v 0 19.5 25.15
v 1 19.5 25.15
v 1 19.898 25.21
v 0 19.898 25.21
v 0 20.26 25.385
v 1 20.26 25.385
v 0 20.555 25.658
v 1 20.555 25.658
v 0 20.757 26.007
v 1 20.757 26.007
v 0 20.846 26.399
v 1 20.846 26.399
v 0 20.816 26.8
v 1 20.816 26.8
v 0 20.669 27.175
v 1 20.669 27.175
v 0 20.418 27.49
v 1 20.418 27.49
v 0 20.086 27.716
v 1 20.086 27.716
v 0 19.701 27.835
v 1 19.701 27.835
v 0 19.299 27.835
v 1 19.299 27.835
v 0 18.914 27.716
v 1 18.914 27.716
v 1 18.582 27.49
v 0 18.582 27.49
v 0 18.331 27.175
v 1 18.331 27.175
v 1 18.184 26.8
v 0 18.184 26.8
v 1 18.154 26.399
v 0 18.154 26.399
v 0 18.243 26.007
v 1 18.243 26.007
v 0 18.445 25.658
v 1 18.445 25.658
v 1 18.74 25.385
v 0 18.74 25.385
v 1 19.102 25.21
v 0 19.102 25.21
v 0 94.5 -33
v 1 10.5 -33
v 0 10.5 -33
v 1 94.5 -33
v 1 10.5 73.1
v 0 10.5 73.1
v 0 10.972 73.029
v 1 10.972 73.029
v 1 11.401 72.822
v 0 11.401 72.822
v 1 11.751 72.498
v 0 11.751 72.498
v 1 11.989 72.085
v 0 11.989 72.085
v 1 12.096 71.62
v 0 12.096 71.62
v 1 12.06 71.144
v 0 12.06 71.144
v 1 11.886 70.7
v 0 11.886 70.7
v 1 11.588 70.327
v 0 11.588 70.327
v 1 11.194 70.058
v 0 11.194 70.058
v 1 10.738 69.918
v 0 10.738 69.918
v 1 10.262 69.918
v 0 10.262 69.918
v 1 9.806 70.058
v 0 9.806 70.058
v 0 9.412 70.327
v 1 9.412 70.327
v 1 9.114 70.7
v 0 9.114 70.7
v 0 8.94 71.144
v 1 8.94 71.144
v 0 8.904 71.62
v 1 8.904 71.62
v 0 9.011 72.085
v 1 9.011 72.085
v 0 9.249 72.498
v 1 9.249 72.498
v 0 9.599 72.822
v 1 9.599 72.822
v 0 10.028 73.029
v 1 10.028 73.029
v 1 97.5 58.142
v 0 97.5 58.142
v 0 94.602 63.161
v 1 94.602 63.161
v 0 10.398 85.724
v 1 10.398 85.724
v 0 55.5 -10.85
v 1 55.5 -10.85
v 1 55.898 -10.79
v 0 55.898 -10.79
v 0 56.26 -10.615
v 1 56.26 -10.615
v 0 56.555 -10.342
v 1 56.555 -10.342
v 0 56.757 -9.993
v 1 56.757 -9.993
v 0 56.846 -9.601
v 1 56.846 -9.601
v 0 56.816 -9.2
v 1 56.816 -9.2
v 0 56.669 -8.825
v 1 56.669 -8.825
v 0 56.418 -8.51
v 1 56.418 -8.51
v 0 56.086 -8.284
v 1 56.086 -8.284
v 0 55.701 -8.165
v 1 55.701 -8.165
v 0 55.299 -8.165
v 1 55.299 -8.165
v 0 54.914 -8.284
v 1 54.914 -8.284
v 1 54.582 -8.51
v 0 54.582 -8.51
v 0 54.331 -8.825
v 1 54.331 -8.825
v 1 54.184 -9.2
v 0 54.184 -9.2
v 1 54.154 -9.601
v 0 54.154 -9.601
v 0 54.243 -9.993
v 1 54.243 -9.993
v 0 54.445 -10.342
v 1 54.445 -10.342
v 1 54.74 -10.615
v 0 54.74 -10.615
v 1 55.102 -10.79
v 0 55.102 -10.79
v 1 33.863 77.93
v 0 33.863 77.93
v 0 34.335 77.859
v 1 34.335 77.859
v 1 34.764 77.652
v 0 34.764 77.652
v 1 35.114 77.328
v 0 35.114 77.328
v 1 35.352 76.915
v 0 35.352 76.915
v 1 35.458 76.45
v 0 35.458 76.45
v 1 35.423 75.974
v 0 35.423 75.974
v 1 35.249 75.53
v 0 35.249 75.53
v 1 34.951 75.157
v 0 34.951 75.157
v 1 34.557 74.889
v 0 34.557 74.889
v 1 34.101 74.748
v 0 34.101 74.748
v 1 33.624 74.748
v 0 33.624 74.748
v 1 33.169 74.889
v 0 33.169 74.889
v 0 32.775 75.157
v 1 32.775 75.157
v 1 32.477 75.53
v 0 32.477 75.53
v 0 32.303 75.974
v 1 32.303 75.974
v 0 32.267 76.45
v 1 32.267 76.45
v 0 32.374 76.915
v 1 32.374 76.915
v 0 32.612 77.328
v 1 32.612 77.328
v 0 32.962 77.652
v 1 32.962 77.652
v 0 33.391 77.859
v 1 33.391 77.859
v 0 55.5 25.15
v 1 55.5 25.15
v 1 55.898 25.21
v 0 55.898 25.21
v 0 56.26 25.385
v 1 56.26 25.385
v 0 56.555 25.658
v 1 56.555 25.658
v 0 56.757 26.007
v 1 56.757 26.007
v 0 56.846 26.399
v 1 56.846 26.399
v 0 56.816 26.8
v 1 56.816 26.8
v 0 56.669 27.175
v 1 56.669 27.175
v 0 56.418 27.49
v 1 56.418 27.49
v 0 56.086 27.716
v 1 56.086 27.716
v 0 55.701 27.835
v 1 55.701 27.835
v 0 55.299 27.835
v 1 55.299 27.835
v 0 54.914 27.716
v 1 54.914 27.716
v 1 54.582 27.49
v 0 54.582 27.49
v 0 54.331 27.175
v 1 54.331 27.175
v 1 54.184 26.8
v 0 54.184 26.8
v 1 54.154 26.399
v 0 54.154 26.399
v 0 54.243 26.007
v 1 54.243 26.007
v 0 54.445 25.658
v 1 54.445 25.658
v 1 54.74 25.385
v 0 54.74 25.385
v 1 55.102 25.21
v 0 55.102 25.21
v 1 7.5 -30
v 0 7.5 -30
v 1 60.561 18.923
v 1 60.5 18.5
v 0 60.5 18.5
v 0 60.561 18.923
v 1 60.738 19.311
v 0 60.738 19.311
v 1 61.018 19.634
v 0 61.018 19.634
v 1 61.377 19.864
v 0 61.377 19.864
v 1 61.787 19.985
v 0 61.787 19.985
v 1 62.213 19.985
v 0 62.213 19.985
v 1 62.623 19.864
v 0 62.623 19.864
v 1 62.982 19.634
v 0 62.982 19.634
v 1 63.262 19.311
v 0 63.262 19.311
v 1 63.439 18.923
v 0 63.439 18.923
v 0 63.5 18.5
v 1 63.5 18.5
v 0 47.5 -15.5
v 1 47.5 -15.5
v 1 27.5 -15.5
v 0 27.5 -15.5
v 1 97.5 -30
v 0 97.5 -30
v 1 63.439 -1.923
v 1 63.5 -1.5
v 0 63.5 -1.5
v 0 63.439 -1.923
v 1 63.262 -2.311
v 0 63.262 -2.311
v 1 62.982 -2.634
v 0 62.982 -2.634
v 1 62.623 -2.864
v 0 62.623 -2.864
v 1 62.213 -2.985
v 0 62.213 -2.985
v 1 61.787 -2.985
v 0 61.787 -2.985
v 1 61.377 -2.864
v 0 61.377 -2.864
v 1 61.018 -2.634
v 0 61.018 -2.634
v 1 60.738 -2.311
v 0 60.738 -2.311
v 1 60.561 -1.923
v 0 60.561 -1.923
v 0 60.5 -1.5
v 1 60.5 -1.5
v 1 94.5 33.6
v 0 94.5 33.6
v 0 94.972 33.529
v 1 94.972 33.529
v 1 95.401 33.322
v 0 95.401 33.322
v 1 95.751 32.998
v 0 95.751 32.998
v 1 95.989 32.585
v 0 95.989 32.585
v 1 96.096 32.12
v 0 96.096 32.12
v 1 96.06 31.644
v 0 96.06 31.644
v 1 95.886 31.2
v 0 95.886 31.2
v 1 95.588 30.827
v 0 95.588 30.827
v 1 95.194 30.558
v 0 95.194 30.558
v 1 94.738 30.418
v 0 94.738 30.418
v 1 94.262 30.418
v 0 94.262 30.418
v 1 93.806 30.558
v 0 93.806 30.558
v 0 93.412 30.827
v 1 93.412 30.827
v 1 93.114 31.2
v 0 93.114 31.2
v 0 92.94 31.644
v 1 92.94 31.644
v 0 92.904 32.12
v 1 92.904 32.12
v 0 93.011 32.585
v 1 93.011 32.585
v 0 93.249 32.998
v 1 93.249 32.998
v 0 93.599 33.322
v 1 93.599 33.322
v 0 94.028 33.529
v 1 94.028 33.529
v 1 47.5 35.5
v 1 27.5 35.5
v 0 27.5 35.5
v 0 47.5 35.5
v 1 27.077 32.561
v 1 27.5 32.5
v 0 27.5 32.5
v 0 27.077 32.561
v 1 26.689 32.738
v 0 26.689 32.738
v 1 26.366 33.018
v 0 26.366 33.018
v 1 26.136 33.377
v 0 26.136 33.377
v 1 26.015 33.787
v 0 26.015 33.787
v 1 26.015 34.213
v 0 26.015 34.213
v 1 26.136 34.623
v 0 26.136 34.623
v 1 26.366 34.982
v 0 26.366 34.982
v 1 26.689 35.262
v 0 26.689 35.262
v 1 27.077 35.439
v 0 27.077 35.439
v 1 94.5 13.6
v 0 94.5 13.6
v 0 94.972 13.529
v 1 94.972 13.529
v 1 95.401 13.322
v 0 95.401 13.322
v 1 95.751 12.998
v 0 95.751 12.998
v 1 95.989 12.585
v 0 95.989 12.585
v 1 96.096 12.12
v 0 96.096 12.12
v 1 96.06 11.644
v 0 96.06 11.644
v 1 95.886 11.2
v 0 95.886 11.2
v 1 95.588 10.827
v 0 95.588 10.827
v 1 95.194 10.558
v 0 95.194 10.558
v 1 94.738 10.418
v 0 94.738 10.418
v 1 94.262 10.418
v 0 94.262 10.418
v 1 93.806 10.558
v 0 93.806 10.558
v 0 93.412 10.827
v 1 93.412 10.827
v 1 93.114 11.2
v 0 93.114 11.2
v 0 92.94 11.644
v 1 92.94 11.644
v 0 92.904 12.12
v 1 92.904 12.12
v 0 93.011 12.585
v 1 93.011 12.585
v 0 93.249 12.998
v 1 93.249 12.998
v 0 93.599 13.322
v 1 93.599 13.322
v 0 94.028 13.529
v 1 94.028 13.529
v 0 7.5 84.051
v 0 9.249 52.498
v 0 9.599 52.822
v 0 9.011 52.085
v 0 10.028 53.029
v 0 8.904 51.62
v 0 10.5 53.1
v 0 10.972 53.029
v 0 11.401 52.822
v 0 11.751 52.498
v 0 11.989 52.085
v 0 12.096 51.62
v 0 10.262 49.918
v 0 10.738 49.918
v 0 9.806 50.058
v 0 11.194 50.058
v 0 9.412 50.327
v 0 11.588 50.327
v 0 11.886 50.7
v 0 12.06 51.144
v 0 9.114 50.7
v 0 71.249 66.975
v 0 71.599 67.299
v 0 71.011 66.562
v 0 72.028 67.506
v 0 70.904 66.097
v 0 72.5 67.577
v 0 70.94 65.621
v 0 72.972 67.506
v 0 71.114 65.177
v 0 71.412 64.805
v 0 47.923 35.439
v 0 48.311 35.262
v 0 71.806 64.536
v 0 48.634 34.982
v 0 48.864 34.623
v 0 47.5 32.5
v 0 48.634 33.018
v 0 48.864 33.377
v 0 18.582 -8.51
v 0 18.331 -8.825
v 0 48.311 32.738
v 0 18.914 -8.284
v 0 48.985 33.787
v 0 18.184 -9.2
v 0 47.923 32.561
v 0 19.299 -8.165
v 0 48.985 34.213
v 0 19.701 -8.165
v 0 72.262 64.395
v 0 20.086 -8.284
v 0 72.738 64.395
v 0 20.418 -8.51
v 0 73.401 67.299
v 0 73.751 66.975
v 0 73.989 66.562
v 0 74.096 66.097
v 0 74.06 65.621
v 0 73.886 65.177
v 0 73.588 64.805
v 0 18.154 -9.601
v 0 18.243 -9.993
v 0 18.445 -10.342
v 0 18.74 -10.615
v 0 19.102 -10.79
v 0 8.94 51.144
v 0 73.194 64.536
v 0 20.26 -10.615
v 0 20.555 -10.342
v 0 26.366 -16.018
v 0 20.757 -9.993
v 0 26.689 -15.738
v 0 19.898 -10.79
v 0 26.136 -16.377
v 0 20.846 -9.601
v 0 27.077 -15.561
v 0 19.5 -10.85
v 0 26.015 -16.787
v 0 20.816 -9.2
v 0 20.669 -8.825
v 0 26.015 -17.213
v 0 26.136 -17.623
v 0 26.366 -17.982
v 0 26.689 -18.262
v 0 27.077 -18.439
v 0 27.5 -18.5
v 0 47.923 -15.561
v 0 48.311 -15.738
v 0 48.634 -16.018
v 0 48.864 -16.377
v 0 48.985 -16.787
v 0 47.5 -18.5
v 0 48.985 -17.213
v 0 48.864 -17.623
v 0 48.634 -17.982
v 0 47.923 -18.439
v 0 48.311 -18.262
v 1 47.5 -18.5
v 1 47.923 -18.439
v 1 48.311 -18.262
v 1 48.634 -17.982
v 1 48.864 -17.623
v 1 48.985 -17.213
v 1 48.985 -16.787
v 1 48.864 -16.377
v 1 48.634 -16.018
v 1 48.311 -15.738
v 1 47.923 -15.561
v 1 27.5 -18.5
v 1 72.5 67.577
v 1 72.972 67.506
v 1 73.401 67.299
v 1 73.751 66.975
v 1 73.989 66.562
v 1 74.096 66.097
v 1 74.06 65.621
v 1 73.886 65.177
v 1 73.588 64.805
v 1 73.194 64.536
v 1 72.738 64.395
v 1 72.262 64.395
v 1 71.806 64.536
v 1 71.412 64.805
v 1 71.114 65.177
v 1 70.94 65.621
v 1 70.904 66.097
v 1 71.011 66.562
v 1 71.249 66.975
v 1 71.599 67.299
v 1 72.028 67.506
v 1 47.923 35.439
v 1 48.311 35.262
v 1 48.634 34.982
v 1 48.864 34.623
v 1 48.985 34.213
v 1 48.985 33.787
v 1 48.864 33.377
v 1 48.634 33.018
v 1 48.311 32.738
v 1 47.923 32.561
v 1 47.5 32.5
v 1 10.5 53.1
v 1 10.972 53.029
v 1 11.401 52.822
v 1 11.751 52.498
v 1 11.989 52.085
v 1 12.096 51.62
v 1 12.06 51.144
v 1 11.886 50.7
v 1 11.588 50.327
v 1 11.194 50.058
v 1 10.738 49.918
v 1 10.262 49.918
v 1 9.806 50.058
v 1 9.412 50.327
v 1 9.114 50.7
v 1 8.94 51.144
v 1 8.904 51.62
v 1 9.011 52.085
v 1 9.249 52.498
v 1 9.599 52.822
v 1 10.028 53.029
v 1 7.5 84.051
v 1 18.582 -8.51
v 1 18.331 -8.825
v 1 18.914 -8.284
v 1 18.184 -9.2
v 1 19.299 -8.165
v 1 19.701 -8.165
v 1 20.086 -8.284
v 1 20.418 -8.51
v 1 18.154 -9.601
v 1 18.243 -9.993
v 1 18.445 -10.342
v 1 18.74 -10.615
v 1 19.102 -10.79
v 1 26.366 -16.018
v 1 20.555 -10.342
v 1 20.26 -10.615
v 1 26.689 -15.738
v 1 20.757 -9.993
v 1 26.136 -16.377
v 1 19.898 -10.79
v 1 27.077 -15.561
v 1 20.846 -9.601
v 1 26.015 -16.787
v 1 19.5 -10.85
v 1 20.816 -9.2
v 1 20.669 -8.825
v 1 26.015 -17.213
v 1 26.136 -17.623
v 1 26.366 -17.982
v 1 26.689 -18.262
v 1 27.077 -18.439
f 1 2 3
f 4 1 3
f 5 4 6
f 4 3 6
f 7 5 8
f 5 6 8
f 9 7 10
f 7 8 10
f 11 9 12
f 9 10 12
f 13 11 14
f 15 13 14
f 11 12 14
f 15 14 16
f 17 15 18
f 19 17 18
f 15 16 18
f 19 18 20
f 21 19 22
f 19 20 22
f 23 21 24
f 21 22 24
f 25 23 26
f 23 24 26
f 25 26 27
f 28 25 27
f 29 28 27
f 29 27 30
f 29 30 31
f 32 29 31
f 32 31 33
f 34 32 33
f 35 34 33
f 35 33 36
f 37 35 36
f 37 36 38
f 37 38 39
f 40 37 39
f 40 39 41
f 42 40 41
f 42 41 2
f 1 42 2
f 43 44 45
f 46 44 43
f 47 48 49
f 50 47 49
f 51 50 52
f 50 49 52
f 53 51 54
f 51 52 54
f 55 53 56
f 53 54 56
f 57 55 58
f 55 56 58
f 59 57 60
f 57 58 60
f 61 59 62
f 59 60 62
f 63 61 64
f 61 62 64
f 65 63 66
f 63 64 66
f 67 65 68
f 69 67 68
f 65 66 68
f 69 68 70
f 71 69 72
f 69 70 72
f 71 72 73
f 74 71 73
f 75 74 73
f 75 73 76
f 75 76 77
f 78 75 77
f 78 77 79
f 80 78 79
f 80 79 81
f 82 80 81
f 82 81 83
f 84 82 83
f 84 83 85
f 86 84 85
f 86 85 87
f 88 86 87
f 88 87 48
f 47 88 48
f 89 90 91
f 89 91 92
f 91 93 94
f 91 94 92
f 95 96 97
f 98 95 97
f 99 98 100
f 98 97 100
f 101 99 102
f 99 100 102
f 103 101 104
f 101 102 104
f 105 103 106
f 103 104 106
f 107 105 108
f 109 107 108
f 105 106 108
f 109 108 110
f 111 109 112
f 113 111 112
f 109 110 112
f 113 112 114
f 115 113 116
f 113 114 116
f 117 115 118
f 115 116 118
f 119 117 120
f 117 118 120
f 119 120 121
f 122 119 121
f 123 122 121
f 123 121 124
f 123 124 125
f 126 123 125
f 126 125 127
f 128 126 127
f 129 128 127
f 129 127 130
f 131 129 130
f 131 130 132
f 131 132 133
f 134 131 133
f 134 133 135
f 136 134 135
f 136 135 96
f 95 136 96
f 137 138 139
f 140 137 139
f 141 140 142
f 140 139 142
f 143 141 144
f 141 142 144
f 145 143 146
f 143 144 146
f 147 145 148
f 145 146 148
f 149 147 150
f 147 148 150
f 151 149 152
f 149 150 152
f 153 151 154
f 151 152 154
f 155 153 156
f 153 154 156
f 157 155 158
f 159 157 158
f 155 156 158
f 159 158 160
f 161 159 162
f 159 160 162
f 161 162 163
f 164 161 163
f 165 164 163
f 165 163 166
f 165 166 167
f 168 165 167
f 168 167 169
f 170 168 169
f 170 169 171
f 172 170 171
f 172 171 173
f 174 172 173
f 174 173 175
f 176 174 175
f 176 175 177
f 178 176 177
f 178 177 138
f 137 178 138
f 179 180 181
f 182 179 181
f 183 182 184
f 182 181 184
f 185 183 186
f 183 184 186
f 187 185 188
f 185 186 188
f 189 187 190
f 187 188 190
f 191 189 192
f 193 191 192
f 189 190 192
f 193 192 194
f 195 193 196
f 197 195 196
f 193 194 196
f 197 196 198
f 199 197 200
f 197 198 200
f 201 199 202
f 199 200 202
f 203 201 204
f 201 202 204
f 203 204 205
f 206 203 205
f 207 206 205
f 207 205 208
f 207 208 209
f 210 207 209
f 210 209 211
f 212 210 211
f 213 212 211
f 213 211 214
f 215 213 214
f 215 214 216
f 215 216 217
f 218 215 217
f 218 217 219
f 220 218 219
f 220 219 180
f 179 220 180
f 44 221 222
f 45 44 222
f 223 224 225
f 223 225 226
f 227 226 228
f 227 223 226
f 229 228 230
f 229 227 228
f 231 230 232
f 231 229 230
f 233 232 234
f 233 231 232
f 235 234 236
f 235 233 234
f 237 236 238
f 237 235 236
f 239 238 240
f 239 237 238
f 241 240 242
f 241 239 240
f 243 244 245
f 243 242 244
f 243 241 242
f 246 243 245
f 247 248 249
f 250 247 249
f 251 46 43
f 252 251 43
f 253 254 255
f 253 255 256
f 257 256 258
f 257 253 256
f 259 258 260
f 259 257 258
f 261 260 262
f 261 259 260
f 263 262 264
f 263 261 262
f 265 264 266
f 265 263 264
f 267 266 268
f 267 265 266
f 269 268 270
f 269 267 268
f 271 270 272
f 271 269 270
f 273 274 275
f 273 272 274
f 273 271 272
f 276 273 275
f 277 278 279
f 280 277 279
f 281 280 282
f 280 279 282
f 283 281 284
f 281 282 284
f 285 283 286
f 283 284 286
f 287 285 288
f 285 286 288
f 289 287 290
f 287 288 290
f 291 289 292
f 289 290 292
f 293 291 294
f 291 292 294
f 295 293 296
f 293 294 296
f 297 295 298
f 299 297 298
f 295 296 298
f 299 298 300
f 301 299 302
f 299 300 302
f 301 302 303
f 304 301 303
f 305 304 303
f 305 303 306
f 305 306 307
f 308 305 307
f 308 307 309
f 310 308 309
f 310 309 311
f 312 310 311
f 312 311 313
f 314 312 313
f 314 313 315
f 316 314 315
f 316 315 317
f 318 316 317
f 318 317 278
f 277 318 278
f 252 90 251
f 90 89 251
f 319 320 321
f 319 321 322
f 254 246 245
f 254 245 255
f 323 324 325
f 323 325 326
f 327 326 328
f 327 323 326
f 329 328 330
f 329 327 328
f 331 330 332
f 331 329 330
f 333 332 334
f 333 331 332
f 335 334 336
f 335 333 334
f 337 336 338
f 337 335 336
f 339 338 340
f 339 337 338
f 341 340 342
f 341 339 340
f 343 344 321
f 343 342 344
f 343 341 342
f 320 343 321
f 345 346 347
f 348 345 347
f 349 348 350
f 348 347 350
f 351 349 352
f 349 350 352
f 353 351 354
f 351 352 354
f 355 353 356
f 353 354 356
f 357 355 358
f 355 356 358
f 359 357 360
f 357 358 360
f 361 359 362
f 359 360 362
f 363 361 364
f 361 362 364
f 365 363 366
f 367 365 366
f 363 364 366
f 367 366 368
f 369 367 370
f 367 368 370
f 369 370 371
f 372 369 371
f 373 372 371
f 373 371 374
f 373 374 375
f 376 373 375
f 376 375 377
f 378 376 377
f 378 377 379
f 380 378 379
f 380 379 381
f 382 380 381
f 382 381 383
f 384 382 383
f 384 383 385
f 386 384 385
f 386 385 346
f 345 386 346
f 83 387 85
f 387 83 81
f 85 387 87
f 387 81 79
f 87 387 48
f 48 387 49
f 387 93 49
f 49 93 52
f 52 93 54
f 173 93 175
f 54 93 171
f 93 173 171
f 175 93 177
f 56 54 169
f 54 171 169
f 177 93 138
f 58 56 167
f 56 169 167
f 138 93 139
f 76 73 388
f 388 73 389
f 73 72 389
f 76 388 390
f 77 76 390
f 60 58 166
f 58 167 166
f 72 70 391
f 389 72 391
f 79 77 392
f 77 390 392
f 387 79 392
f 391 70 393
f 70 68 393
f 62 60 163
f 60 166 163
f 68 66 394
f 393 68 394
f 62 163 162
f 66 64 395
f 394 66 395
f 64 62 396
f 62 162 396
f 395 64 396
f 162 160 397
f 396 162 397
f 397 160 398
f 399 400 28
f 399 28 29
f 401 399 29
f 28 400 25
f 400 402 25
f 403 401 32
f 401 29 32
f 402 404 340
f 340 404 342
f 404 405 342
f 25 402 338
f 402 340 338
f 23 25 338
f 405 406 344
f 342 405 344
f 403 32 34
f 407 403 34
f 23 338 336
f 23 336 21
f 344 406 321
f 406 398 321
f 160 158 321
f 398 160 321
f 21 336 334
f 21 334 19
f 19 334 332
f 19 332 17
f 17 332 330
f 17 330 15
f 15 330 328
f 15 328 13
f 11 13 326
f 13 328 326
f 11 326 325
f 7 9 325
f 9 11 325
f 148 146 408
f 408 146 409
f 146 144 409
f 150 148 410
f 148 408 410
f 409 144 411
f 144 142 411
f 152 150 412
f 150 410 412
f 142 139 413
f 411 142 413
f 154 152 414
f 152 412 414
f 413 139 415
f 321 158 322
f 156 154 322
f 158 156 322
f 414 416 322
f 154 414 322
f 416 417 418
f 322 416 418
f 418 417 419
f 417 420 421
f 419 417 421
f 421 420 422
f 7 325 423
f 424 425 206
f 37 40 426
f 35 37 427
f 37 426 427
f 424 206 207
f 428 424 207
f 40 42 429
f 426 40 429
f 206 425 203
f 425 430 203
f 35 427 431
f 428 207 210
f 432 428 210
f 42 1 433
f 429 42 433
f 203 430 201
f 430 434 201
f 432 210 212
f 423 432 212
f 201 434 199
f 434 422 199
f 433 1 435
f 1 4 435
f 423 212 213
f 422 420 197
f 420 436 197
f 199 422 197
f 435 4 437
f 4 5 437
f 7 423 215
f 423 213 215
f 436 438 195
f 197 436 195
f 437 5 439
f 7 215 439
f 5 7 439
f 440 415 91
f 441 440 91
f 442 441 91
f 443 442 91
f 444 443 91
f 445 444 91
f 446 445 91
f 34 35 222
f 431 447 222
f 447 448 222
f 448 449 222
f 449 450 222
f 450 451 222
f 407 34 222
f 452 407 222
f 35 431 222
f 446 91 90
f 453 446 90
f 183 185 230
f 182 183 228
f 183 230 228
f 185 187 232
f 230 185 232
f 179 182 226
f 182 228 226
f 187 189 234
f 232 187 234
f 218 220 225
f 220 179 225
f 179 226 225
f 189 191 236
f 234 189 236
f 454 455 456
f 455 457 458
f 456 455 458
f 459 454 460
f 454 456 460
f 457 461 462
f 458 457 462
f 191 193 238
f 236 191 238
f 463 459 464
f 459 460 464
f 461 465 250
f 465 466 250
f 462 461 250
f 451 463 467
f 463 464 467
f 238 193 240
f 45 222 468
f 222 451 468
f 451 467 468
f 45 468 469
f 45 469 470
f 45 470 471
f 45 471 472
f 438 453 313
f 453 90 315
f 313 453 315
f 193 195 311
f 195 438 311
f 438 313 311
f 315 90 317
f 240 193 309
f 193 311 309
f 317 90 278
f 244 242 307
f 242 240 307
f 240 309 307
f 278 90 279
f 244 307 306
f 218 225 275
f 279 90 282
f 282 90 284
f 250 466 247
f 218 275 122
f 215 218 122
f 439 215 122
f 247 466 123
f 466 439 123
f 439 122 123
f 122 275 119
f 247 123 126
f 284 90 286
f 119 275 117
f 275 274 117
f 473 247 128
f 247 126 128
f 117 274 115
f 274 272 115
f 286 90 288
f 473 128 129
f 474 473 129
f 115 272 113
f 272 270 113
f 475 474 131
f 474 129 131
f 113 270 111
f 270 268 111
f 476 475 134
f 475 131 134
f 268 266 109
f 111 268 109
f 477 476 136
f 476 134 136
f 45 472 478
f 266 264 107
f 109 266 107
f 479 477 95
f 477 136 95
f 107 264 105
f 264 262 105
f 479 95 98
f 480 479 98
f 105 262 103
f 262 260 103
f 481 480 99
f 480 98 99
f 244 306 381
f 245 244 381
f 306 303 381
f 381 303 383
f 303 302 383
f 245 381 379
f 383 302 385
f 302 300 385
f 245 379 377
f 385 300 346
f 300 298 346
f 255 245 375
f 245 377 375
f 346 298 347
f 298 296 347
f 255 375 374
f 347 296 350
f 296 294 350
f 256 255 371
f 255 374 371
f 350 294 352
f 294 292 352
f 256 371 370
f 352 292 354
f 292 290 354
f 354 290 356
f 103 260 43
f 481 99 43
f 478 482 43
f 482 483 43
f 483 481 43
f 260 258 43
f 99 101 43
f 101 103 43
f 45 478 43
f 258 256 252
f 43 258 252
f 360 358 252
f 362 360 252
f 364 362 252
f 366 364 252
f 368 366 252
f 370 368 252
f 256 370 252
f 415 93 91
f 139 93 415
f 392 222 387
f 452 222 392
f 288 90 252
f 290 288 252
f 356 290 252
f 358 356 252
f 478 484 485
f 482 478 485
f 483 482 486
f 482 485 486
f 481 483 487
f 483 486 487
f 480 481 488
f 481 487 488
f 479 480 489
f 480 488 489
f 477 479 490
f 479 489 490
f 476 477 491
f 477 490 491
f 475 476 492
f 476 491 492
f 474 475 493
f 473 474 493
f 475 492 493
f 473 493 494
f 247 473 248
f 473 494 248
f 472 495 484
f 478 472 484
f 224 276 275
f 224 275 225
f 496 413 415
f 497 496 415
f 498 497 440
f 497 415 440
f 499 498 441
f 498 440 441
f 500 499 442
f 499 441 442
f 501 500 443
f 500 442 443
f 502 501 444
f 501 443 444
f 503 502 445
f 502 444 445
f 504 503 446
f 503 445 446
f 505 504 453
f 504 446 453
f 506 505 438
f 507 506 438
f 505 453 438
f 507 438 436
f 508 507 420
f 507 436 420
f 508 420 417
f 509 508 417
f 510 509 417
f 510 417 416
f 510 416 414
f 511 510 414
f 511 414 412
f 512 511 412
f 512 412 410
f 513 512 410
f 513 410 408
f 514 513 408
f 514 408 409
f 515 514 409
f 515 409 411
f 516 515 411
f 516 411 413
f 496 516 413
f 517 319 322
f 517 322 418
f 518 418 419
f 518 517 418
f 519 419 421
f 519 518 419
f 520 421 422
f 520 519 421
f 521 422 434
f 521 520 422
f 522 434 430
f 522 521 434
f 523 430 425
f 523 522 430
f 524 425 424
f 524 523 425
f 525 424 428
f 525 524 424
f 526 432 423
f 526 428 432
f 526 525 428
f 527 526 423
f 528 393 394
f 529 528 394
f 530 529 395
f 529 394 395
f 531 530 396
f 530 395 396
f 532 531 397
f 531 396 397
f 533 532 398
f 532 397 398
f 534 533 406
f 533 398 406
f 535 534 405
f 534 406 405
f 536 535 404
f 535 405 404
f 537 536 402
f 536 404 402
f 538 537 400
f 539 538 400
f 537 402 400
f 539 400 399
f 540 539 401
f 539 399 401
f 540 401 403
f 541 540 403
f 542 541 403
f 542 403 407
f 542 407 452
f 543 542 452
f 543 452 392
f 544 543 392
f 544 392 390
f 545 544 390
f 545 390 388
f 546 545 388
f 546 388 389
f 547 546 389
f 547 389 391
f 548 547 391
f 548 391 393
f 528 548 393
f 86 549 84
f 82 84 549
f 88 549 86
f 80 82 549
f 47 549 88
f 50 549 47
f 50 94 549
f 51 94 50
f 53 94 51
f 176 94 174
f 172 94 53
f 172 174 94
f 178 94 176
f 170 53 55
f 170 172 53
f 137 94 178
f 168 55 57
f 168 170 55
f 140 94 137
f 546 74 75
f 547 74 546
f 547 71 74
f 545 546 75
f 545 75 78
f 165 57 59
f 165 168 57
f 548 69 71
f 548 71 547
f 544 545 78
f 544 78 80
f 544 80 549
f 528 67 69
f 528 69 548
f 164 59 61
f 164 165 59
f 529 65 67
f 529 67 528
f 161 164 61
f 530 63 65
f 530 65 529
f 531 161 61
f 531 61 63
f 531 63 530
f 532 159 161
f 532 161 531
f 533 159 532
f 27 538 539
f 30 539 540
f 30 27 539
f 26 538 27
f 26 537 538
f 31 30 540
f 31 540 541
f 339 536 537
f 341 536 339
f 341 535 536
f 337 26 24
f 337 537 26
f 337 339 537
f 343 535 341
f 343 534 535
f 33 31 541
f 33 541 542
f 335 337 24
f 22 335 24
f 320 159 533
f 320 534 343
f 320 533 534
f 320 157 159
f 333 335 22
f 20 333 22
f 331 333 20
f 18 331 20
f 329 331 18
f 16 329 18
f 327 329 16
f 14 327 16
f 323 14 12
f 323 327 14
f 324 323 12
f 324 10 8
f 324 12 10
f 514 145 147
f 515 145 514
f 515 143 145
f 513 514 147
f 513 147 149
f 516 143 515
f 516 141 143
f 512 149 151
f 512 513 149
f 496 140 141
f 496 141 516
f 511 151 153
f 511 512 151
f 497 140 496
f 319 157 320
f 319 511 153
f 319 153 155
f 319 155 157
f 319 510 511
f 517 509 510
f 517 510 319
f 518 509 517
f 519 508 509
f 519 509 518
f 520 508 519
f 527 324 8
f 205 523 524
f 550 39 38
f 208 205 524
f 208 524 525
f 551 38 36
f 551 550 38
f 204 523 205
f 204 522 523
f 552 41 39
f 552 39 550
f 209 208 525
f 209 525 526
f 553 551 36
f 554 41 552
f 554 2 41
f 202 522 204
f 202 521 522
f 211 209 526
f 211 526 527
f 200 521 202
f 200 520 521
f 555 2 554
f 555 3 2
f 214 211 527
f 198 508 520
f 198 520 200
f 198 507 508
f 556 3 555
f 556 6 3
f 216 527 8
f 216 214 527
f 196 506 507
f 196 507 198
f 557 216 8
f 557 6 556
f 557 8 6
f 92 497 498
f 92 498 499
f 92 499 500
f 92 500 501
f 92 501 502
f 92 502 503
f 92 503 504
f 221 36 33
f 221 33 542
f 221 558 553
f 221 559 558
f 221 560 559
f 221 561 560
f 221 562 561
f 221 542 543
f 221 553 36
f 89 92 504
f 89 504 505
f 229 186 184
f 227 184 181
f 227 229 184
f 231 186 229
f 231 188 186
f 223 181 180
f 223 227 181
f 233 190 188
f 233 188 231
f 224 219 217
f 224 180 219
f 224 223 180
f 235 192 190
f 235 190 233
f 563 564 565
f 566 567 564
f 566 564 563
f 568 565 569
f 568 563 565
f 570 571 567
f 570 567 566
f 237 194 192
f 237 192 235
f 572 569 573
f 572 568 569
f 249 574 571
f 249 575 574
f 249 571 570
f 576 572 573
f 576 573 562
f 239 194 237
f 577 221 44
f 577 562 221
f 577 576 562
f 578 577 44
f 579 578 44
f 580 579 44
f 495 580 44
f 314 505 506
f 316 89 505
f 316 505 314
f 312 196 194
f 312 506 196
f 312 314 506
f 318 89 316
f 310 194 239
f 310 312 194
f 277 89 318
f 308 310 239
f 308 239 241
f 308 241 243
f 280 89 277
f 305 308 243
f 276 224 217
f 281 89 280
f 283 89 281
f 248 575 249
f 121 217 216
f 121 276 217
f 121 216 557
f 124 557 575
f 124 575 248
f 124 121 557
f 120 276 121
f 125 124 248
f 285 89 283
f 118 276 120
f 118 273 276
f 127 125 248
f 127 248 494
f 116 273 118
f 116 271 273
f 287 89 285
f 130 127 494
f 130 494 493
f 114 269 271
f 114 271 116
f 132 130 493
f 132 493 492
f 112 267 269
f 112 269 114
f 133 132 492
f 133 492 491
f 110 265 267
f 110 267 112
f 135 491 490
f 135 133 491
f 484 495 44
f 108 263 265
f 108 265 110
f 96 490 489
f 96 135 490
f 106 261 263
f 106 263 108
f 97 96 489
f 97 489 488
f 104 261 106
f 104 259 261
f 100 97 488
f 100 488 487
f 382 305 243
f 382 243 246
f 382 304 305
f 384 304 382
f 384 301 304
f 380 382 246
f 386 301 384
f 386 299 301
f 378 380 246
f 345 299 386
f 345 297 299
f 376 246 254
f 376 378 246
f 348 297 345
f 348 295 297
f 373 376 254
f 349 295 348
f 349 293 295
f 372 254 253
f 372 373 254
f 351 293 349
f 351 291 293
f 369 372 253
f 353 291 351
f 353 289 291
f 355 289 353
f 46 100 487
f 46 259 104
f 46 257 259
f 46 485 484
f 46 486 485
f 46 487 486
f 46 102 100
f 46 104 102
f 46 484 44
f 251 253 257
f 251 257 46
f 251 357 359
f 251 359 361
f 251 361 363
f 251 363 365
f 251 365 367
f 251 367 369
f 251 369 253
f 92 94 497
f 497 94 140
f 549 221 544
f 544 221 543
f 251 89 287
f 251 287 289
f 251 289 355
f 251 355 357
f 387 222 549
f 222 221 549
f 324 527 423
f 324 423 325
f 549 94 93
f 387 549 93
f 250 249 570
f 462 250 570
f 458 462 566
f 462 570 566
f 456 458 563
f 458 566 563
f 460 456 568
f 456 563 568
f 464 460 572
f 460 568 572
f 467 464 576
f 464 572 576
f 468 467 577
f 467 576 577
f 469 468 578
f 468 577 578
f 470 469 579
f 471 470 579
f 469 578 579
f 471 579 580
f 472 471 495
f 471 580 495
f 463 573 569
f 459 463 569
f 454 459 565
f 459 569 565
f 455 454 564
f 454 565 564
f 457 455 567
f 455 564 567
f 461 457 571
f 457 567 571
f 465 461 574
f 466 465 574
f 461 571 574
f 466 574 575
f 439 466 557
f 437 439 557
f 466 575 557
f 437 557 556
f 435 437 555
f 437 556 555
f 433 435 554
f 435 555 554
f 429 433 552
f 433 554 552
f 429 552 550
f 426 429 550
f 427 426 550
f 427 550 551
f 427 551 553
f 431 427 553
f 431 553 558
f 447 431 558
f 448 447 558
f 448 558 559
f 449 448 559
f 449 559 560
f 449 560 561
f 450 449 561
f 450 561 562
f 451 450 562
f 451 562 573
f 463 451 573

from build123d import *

# Parameters (mm, degrees)
SKETCH_1_W               = 60
SKETCH_1_H               = 44
SKETCH_1_R               = 1.6
EXTRUDE_1_DEPTH          = 1
SKETCH_2_W               = 134.5
SKETCH_2_H               = 90
EXTRUDE_2_DEPTH          = 1
CUT_EXTRUDE_1_DEPTH      = 2
SKETCH_4_R               = 1.6
CUT_EXTRUDE_2_DEPTH      = 2
SKETCH_5_R               = 1.35
CUT_EXTRUDE_3_DEPTH      = 2
SKETCH_6_W               = 15
SKETCH_6_H               = 90
CUT_EXTRUDE_4_DEPTH      = 1
CUT_EXTRUDE_4_DEPTH_BACK = 2
SKETCH_7_W               = 9
SKETCH_7_H               = 22.5
CUT_EXTRUDE_5_DEPTH      = 2
FILLET_1_R               = 2
CUT_EXTRUDE_6_DEPTH      = 2
CUT_EXTRUDE_7_DEPTH      = 2
CHAMFER_2_SIZE           = 3
CHAMFER_2_EDGE_2_SIZE    = 3
CHAMFER_2_EDGE_3_SIZE2   = 3
CHAMFER_2_EDGE_3_SIZE    = 2.449489743
CHAMFER_2_EDGE_4_SIZE2   = 4.242640687
CHAMFER_2_EDGE_4_SIZE    = 3


with BuildPart() as part:
    # 草图1 → 凸台-拉伸1 (new body)
    with BuildSketch(Plane(origin=(0, 0, 0), x_dir=(0, 0, -1), z_dir=(1, 0, 0))):
        with Locations((18, -14.5)):
            Rectangle(SKETCH_1_W, SKETCH_1_H)
        Circle(SKETCH_1_R, mode=Mode.SUBTRACT)
        with Locations((17, 0)):
            Circle(SKETCH_1_R, mode=Mode.SUBTRACT)
        with Locations((0, -30.5)):
            Circle(SKETCH_1_R, mode=Mode.SUBTRACT)
        with Locations((17, -30.5)):
            Circle(SKETCH_1_R, mode=Mode.SUBTRACT)
        with Locations((31.5, -30.5)):
            Circle(SKETCH_1_R, mode=Mode.SUBTRACT)
    extrude(amount=EXTRUDE_1_DEPTH)

    # 草图2 → 凸台-拉伸2 (add)
    with BuildSketch(Plane(origin=(1, 0, 0), x_dir=(0, 0, -1), z_dir=(1, 0, 0))):
        with Locations((-19.25, 52.5)):
            Rectangle(SKETCH_2_W, SKETCH_2_H)
    extrude(amount=-EXTRUDE_2_DEPTH)

    # 草图3 → 切除-拉伸1 (cut, through all)
    with BuildSketch(Plane.ZY):
        Polygon((86.5, 7.5), (62.384572681, 97.5), (86.5, 97.5), align=None)
    extrude(amount=-CUT_EXTRUDE_1_DEPTH, mode=Mode.SUBTRACT)

    # 草图4 → 切除-拉伸2 (cut, through all)
    with BuildSketch(Plane.ZY):
        with Locations((71.5, 10.5)):
            Circle(SKETCH_4_R)
        with Locations((51.5, 10.5)):
            Circle(SKETCH_4_R)
        with Locations((12, 94.5)):
            Circle(SKETCH_4_R)
        with Locations((32, 94.5)):
            Circle(SKETCH_4_R)
        with Locations((65.977473951, 72.5)):
            Circle(SKETCH_4_R)
        with Locations((76.330235755, 33.862966948)):
            Circle(SKETCH_4_R)
    extrude(amount=-CUT_EXTRUDE_2_DEPTH, mode=Mode.SUBTRACT)

    # 草图5 → 切除-拉伸3 (cut, through all)
    with BuildSketch(Plane(origin=(1, 0, 0), x_dir=(0, 0, -1), z_dir=(1, 0, 0))):
        with Locations((-26.5, 55.5)):
            Circle(SKETCH_5_R)
        with Locations((9.5, 55.5)):
            Circle(SKETCH_5_R)
        with Locations((9.5, 19.5)):
            Circle(SKETCH_5_R)
        with Locations((-26.5, 19.5)):
            Circle(SKETCH_5_R)
    extrude(amount=-CUT_EXTRUDE_3_DEPTH, mode=Mode.SUBTRACT)

    # 草图6 → 切除-拉伸4 (cut, two sides)
    with BuildSketch(Plane(origin=(1, 0, 0), x_dir=(0, 0, -1), z_dir=(1, 0, 0))) as cut_extrude_4_sk:
        with Locations((40.5, 52.5)):
            Rectangle(SKETCH_6_W, SKETCH_6_H)
    extrude(amount=CUT_EXTRUDE_4_DEPTH, mode=Mode.SUBTRACT)
    extrude(cut_extrude_4_sk.sketch, amount=-CUT_EXTRUDE_4_DEPTH_BACK, mode=Mode.SUBTRACT)

    # 草图7 → 切除-拉伸5 (cut, through all)
    with BuildSketch(Plane(origin=(1, 0, 0), x_dir=(0, 0, -1), z_dir=(1, 0, 0))):
        with Locations((8.5, -15.25)):
            Rectangle(SKETCH_7_W, SKETCH_7_H)
    extrude(amount=-CUT_EXTRUDE_5_DEPTH, mode=Mode.SUBTRACT)

    # 圆角1
    fillet_1_edges = [part.edges().sort_by_distance(p)[0] for p in [
        (0.5, -4, -13),
        (0.5, -26.5, -13),
        (0.5, -26.5, -4),
        (0.5, -4, -4),
    ]]
    fillet(fillet_1_edges, radius=FILLET_1_R)

    # 草图8 → 切除-拉伸6 (cut, through all)
    with BuildSketch(Plane(origin=(1, 0, 0), x_dir=(0, 0, -1), z_dir=(1, 0, 0))):
        Polygon((-12, 7.5), (33, 7.5), (48, 7.5), (48, -36.5), (-12, -36.5), align=None)
    extrude(amount=-CUT_EXTRUDE_6_DEPTH, mode=Mode.SUBTRACT)

    # 草图9 → 切除-拉伸7 (cut, through all)
    with BuildSketch(Plane(origin=(1, 0, 0), x_dir=(0, 0, -1), z_dir=(1, 0, 0))):
        with BuildLine():
            Line((-18.5, 63.5), (1.5, 63.5))
            ThreePointArc((1.5, 63.5), (3, 62), (1.5, 60.5))
            Line((1.5, 60.5), (-18.5, 60.5))
            ThreePointArc((-18.5, 60.5), (-20, 62), (-18.5, 63.5))
        make_face()
        with BuildLine():
            Line((-32.5, 47.5), (-32.5, 27.5))
            ThreePointArc((-32.5, 27.5), (-34, 26), (-35.5, 27.5))
            Line((-35.5, 27.5), (-35.5, 47.5))
            ThreePointArc((-35.5, 47.5), (-34, 49), (-32.5, 47.5))
        make_face()
        with BuildLine():
            Line((15.5, 47.5), (15.5, 27.5))
            ThreePointArc((15.5, 27.5), (17, 26), (18.5, 27.5))
            Line((18.5, 27.5), (18.5, 47.5))
            ThreePointArc((18.5, 47.5), (17, 49), (15.5, 47.5))
        make_face()
    extrude(amount=-CUT_EXTRUDE_7_DEPTH, mode=Mode.SUBTRACT)

    # 倒角2
    chamfer_2_edges = [part.edges().sort_by_distance(p)[0] for p in [
        (0.5, 7.5, -33),
    ]]
    chamfer(chamfer_2_edges, length=CHAMFER_2_SIZE)

    # 倒角2 edge 2
    chamfer_2_edge_2_edges = [part.edges().sort_by_distance(p)[0] for p in [
        (0.5, 97.5, -33),
    ]]
    chamfer(chamfer_2_edge_2_edges, length=CHAMFER_2_EDGE_2_SIZE)

    # 倒角2 edge 3
    chamfer_2_edge_3_edges = [part.edges().sort_by_distance(p)[0] for p in [
        (0.5, 7.5, 86.5),
    ]]
    chamfer(chamfer_2_edge_3_edges, length=CHAMFER_2_EDGE_3_SIZE, length2=CHAMFER_2_EDGE_3_SIZE2)

    # 倒角2 edge 4
    chamfer_2_edge_4_edges = [part.edges().sort_by_distance(p)[0] for p in [
        (0.5, 97.5, 62.384572681),
    ]]
    chamfer(chamfer_2_edge_4_edges, length=CHAMFER_2_EDGE_4_SIZE, length2=CHAMFER_2_EDGE_4_SIZE2)


solid = part.part
